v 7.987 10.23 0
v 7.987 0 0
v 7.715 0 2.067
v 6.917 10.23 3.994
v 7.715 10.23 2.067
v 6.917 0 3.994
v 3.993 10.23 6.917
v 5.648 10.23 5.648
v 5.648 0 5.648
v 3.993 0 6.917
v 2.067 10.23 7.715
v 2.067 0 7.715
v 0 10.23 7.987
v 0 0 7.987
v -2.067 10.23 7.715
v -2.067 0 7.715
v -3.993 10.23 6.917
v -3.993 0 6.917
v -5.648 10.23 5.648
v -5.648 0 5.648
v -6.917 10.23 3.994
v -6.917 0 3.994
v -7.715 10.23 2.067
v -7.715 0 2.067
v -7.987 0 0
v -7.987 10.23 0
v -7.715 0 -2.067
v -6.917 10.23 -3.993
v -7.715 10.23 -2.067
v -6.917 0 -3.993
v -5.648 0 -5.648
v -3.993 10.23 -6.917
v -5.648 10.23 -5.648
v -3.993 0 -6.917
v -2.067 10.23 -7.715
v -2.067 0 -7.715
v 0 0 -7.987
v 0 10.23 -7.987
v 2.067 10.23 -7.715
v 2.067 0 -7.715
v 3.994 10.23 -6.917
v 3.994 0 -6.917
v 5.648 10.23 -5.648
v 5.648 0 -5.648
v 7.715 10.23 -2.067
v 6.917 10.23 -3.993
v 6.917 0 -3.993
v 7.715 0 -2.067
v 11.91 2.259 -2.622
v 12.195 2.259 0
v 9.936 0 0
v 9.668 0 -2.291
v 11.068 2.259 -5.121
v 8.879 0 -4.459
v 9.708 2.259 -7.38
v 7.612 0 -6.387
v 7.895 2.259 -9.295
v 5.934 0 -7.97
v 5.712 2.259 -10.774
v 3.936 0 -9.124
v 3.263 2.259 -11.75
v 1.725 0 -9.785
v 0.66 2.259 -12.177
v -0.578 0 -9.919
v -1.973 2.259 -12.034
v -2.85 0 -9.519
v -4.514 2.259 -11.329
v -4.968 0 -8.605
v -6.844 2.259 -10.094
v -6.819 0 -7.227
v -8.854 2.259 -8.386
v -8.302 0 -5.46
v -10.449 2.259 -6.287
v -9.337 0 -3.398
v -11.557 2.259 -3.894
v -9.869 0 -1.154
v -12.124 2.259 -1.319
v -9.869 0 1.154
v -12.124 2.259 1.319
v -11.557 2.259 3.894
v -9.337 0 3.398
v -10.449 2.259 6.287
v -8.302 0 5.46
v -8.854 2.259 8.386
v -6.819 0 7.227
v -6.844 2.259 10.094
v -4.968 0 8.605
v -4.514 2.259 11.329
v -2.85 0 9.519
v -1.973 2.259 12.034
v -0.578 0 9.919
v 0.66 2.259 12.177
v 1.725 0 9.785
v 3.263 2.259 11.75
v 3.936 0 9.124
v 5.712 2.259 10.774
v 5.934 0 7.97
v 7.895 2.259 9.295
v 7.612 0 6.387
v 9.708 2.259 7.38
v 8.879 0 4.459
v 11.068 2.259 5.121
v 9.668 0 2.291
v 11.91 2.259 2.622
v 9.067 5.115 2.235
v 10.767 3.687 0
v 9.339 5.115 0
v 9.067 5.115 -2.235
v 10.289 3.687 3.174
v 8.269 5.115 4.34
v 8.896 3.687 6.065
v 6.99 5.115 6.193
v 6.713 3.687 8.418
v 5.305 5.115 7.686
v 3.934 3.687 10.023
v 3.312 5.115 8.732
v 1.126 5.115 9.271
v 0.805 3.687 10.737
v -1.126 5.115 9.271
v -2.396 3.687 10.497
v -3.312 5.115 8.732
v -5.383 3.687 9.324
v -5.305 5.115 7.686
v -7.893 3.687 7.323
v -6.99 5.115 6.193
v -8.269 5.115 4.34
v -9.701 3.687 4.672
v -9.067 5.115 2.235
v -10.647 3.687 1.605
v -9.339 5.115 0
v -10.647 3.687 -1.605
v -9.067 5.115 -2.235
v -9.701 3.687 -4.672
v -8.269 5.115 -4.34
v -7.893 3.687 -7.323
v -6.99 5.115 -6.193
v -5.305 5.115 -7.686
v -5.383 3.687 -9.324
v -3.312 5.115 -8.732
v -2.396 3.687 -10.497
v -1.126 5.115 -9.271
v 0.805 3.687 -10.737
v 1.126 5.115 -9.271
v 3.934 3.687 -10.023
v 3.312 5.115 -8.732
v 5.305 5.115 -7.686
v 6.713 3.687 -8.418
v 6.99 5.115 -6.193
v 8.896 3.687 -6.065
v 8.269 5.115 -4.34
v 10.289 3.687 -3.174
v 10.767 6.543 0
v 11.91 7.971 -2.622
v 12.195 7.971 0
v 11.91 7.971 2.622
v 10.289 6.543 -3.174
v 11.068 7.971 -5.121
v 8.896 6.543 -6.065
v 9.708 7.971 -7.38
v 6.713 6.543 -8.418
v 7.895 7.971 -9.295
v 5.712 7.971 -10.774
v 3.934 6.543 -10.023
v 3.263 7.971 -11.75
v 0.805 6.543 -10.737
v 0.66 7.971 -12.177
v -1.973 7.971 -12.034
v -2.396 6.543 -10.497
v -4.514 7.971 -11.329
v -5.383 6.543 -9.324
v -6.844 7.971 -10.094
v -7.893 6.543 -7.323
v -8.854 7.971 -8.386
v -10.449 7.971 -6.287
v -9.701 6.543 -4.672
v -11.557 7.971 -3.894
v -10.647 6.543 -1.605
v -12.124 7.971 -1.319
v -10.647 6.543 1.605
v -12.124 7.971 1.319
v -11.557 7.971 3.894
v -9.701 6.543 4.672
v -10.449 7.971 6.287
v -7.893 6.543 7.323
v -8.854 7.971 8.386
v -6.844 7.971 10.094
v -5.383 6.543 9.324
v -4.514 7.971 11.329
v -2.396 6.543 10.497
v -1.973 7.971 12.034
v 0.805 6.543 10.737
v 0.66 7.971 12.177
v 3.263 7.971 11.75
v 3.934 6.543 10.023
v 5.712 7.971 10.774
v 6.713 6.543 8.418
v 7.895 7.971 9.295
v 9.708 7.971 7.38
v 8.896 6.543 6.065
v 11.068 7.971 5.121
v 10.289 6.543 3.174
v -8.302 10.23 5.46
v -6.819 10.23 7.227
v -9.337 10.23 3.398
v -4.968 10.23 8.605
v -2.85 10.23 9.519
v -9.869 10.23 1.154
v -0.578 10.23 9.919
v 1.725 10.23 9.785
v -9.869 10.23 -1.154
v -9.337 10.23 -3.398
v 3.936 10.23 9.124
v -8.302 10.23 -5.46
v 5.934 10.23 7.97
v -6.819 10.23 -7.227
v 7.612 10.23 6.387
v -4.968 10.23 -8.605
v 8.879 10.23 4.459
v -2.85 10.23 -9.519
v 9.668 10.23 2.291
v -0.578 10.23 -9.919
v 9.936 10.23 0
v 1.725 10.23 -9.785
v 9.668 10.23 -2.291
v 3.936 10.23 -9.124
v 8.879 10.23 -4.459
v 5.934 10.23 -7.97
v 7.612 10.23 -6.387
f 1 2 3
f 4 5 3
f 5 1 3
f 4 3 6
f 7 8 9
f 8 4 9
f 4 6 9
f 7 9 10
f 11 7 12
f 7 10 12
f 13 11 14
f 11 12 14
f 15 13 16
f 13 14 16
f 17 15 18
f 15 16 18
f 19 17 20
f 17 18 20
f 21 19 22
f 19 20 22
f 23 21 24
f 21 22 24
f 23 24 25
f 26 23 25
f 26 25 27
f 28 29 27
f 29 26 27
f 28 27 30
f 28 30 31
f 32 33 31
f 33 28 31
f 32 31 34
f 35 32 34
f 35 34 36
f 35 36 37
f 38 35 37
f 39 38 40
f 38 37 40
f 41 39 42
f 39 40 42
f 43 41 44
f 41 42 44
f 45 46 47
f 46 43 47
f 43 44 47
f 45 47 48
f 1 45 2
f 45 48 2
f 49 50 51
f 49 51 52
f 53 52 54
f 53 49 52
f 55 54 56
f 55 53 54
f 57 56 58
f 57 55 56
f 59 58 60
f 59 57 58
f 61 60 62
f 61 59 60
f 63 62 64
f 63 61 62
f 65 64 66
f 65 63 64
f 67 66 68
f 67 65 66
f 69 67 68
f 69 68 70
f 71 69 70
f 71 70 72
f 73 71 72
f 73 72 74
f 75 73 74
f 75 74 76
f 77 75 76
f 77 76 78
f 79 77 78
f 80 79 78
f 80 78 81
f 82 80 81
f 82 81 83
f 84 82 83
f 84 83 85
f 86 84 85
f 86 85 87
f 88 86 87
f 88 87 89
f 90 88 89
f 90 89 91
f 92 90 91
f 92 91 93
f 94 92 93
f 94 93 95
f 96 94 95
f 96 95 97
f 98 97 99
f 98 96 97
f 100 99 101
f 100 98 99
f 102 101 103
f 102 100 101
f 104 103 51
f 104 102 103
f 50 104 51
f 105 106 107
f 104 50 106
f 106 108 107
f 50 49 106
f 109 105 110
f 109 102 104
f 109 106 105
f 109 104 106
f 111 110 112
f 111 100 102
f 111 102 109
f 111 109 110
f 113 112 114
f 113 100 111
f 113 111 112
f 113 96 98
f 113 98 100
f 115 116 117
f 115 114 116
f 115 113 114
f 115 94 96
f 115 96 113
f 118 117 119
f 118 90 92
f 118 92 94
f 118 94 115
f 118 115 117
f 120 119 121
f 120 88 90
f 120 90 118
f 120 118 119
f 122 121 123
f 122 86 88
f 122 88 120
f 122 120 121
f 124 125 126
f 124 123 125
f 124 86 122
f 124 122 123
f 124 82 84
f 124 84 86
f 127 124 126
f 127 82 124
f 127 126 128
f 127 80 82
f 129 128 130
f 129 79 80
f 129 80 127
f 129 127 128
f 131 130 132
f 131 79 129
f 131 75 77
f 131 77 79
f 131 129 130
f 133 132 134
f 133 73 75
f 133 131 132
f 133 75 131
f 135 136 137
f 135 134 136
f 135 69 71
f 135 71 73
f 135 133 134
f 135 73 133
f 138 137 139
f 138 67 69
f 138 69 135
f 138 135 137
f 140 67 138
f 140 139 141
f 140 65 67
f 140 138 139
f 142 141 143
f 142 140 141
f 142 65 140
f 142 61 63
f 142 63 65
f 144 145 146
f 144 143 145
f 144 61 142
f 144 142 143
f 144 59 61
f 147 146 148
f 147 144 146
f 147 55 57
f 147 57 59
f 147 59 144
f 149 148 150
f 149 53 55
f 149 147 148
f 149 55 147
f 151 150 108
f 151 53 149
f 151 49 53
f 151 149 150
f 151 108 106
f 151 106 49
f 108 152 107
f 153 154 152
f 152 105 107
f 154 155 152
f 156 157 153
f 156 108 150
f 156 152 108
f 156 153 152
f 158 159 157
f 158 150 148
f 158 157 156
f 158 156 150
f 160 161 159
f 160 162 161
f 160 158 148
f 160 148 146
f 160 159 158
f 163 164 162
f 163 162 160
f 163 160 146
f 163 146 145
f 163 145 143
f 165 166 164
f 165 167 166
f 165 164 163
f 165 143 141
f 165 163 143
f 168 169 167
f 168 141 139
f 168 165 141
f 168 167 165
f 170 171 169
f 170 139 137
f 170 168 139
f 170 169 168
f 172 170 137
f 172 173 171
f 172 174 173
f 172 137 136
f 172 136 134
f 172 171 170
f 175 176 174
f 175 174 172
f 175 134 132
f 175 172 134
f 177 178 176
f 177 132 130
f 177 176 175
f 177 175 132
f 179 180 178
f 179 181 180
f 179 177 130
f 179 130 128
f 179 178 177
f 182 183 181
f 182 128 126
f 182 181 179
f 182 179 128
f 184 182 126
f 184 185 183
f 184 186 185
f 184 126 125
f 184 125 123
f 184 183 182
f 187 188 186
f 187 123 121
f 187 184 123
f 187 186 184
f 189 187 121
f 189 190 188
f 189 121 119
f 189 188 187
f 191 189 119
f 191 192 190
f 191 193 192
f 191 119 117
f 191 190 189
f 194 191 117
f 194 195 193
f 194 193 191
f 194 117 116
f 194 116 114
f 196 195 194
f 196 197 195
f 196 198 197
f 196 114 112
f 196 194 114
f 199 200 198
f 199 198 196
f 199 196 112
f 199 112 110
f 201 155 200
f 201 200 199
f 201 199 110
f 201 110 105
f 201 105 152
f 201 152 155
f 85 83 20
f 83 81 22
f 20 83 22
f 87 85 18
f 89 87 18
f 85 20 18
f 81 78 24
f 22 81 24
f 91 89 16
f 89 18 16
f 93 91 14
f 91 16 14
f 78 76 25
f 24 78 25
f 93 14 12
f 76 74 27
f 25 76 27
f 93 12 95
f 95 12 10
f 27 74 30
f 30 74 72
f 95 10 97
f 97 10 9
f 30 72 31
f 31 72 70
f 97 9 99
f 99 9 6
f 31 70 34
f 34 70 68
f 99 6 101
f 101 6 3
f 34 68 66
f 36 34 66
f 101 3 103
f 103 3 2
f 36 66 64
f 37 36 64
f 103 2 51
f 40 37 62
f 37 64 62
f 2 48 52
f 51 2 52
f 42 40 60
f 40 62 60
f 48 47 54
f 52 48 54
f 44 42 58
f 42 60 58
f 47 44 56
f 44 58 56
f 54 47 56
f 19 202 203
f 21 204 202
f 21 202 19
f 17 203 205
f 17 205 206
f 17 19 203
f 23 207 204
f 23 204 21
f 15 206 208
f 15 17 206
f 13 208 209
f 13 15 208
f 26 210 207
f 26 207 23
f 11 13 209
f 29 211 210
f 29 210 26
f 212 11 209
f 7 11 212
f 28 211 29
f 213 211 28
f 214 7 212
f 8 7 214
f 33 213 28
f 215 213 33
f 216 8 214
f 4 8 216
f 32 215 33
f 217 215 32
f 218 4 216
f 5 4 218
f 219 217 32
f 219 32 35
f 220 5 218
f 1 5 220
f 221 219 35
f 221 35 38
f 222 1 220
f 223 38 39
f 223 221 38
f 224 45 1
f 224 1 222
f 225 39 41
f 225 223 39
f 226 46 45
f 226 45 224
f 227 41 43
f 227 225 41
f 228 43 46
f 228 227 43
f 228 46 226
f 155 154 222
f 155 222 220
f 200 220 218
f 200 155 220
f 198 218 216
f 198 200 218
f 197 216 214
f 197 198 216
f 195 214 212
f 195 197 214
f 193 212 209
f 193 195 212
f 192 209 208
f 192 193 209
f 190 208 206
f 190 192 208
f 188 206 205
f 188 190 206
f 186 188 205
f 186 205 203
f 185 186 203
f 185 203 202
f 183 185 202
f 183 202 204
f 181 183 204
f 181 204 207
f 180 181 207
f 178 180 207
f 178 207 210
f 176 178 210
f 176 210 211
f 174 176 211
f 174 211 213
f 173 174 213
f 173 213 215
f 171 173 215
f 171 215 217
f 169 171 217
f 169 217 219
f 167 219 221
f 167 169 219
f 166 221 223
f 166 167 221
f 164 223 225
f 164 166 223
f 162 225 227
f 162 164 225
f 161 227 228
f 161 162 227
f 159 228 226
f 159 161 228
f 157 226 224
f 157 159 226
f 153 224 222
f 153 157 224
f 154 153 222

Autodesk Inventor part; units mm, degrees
ref_plane "YZ Plane" through (0, 0, 0) normal (1, 0, 0) x (0, 1, 0)
ref_plane "XZ Plane" through (0, 0, 0) normal (0, 1, 0) x (-1, 0, 0)
ref_plane "XY Plane" through (0, 0, 0) normal (0, 0, 1) x (1, 0, 0)
sketch "Sketch1" plane through (0, 0, 0) normal (0, 0, 1) x (1, 0, 0)
  line L0 (0, 0) -> (0, 12.4297) construction
  line L1 (7.987, 0) -> (9.9363, 0)
  line L2 (9.9363, 0) -> (12.195, 2.2587)
  line L3 (12.195, 2.2587) -> (9.3387, 5.115)
  line L4 (9.3387, 5.115) -> (12.195, 7.9713)
  line L5 (12.195, 7.9713) -> (9.9363, 10.23)
  line L6 (9.9363, 10.23) -> (7.987, 10.23)
  line L7 (7.987, 10.23) -> (7.987, 0)
  line L8 (7.987, 5.115) -> (38.026, 5.115) construction
  line L9 (0, 0) -> (31.3179, 0) construction
  dimension "d0" = 10.23
  dimension "d1" = 15.974
  dimension "d2" = 90
  dimension "d4" = 90
  dimension "d5" = 24.39
revolve "Revolution1" add sketch "Sketch1" angle 360 about axis through (0, 0, 0) along (0, 1, 0)
properties part number "Delrin V-Wheel"
